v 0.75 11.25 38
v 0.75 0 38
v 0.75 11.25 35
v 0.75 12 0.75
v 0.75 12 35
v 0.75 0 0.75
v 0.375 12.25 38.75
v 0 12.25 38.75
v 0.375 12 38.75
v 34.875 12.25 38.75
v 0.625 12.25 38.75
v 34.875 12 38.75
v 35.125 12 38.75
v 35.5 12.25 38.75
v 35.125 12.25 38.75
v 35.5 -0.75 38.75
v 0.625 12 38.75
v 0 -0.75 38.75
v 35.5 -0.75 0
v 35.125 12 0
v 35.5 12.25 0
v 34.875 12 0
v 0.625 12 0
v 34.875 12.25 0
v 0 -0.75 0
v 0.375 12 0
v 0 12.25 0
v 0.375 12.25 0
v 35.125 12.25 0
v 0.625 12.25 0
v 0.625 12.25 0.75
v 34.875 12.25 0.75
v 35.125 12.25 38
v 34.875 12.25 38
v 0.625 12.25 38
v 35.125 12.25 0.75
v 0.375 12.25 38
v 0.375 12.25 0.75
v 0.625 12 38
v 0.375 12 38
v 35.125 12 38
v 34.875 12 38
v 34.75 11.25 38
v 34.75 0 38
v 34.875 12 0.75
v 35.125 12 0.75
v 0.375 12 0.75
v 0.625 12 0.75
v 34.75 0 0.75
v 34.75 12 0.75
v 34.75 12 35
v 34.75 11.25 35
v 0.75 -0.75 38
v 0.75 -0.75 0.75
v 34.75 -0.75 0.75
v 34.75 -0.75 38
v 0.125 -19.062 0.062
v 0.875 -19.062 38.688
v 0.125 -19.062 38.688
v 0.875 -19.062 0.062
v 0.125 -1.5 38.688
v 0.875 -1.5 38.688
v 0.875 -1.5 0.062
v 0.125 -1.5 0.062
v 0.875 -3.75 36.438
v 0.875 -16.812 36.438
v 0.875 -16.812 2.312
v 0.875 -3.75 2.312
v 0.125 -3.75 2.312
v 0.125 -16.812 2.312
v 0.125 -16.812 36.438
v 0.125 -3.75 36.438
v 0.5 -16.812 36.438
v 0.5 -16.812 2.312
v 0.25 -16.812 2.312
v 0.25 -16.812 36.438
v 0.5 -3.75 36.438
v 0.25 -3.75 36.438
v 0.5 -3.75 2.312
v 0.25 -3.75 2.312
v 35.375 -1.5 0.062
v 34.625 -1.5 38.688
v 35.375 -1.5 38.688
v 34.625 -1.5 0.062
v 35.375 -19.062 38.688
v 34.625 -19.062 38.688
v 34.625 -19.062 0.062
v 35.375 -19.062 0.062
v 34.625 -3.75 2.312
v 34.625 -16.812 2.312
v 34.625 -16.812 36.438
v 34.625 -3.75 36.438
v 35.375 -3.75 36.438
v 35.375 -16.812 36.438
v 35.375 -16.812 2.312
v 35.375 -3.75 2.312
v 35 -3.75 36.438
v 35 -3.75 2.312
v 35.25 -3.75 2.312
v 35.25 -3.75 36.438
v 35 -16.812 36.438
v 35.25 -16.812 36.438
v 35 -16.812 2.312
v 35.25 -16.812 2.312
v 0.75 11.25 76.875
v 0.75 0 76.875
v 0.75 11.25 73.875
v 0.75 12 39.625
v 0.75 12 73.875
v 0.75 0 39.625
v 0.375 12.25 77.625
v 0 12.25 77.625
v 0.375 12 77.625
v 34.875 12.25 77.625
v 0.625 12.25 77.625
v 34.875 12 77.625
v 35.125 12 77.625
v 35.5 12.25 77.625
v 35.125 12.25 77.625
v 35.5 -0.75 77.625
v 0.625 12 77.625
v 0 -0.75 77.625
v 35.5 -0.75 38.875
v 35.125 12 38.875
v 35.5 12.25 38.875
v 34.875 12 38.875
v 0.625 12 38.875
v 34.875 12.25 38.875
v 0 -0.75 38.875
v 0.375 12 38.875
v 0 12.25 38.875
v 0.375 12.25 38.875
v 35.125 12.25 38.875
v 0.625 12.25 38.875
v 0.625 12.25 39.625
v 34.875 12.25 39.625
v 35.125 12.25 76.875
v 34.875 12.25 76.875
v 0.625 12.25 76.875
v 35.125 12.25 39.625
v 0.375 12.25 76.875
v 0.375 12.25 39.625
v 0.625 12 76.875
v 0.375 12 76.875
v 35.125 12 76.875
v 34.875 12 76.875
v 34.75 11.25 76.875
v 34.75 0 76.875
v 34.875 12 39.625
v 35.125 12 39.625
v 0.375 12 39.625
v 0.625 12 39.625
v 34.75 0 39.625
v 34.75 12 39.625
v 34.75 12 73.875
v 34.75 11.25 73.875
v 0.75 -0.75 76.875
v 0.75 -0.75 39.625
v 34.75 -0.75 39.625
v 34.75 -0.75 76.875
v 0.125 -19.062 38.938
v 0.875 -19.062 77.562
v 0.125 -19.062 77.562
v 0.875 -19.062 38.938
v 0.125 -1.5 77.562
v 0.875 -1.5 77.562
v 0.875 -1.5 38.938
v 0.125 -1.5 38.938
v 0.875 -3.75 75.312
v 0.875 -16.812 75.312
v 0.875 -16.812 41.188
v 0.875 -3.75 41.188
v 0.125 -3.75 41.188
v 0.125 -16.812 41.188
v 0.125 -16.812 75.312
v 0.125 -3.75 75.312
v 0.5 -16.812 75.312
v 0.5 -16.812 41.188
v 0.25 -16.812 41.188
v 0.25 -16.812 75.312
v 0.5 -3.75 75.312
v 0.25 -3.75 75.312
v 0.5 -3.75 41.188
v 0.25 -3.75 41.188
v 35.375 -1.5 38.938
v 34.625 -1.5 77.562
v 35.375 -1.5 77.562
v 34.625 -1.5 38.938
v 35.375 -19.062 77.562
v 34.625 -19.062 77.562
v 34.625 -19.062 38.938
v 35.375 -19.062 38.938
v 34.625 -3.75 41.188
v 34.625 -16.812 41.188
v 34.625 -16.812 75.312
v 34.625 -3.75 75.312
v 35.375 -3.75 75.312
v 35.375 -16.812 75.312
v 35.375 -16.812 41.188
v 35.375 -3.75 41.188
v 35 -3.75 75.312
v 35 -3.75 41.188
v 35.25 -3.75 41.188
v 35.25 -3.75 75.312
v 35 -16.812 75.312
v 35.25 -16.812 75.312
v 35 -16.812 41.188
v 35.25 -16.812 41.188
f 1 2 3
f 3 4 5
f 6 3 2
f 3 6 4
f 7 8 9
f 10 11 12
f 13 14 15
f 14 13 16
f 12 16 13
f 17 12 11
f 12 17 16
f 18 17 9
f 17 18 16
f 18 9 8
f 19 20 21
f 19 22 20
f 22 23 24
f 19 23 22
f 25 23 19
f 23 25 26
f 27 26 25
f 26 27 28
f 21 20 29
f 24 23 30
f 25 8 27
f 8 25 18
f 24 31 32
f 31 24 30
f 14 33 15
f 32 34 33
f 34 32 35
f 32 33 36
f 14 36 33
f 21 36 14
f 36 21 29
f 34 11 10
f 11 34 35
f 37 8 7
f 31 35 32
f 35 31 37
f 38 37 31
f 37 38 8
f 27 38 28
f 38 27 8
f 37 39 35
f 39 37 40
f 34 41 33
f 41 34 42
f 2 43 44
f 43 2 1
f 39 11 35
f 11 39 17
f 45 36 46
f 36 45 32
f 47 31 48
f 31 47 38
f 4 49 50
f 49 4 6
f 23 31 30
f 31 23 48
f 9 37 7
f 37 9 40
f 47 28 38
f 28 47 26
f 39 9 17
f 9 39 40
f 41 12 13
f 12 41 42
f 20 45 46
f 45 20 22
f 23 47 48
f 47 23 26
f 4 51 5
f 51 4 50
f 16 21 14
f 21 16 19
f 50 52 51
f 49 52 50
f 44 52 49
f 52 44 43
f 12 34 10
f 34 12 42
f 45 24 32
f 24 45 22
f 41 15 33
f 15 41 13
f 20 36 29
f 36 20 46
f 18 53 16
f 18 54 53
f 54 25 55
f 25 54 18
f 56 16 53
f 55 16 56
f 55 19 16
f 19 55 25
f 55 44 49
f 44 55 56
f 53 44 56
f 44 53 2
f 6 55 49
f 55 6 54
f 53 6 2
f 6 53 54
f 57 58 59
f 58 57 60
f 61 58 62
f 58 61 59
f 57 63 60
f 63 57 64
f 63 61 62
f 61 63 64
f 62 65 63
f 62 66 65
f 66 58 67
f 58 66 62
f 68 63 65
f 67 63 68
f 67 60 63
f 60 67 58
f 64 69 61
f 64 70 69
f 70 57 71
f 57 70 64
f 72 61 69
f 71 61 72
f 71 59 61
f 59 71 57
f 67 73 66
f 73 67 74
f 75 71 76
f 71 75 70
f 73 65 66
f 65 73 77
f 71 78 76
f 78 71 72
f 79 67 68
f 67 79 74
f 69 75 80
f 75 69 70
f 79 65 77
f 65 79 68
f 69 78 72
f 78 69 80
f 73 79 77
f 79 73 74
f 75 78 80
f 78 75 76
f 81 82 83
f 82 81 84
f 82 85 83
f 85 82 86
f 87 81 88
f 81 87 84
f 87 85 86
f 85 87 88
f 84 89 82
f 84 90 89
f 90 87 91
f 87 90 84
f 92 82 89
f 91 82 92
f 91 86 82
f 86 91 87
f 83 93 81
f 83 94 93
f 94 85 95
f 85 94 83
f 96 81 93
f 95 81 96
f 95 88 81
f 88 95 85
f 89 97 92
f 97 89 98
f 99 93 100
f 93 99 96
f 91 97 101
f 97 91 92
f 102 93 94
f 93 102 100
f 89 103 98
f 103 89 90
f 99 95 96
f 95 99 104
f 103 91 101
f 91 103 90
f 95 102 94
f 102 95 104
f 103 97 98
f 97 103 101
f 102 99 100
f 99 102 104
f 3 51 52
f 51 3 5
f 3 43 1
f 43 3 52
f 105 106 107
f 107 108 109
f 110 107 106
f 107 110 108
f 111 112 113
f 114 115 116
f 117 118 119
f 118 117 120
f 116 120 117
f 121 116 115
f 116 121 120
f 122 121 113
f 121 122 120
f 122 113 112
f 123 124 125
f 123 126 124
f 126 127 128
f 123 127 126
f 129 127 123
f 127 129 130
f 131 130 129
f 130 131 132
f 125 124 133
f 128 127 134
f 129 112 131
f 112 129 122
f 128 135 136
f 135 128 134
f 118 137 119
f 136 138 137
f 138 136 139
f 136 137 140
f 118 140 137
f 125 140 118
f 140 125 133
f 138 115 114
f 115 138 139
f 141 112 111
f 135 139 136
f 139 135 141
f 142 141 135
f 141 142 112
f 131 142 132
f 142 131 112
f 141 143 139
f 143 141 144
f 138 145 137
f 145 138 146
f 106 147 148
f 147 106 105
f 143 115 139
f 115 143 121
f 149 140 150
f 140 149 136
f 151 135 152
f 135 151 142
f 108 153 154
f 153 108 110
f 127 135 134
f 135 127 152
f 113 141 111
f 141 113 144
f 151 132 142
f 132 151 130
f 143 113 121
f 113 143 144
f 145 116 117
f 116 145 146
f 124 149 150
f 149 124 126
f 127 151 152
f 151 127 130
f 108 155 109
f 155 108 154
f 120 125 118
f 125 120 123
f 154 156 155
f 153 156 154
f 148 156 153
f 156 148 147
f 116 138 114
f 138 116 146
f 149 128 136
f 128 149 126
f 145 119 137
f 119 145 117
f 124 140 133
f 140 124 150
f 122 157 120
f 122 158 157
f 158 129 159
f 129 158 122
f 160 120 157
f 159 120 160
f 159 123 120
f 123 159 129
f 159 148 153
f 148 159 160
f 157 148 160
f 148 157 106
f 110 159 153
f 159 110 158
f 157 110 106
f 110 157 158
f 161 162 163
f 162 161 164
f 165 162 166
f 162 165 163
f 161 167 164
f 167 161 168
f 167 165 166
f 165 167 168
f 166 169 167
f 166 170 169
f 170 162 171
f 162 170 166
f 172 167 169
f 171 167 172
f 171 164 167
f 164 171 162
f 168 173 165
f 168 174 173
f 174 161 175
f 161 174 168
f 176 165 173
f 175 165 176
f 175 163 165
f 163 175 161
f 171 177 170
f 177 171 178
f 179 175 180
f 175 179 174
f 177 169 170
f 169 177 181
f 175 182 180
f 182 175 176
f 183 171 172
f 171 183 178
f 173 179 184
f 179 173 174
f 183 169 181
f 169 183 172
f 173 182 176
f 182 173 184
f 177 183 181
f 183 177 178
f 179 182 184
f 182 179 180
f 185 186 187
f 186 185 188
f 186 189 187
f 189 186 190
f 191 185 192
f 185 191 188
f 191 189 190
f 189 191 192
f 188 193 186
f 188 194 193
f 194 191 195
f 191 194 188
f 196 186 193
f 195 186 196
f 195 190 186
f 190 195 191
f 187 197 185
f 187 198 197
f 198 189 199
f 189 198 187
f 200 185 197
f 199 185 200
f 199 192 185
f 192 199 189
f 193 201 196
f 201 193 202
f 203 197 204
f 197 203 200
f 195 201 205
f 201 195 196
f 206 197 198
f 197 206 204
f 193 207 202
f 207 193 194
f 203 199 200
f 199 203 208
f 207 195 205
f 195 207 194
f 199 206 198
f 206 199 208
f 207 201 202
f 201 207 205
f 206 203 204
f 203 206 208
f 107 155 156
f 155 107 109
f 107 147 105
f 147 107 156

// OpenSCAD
// --- 1. YOUR EXACT SPECS (INCHES) ---
ancho_total   = 35.5; 
alto_total    = 38.75;   
fondo_box     = 12.25;    
t_plywood     = 0.75;     
t_backer      = 0.25;     
t_face_maple  = 0.75;     
rabbet_d      = 0.125; 

// --- BACKER RABBET SPECS ---
backer_rab_w  = 0.25;     
backer_rab_d  = 0.375;    

// --- MOUNTING BRACKET ---
h_bracket     = 3.0;      
t_bracket     = 0.75;     

// --- 2. YOUR DOOR SPECS ---
door_w        = 17.5625; 
door_h        = 38.625;  
frame_w       = 2.25;     
t_door        = 0.75;     // Thickness of Maple Frame
t_panel       = 0.25;     // Thickness of Plywood Insert
panel_nest_d  = 0.125;    // Recess depth from front face

// Calculated Door Panel (includes 1/4" tongue for the grooves)
panel_w_calc  = door_w - (frame_w * 2) + 0.5;
panel_h_calc  = door_h - (frame_w * 2) + 0.5;

explode       = 0; 
show_labels   = (explode > 0);
Door_Open_Angle = 90;

// --- 3. COLORS ---
color_plywood = [0.82, 0.71, 0.55]; 
color_maple   = [0.45, 0.29, 0.07]; 

$fn = 60;

// --- 4. HELPER: MEASUREMENT LABELS ---
module dim_label(txt, loc=[0,0,0], rot=[90,0,0]) {
    if (show_labels) {
        translate(loc) rotate(rot)
        color("DimGray") linear_extrude(0.1)
            text(str(txt, "\""), size=1.2, halign="center", font="Arial:style=Bold");
    }
}

// --- 5. DOOR MODULE ---
module shaker_door(is_right_door = false) {
    rail_w = door_w - (frame_w * 2);
    pivot_x = is_right_door ? door_w : 0;
    
    rotate([0, 0, is_right_door ? Door_Open_Angle : -Door_Open_Angle])
    translate([-pivot_x, 0, 0])
    union() {
        // THE MAPLE FRAME
        color(color_maple) difference() {
            cube([door_w, t_door, door_h]); 
            // The cutout for the panel
            translate([frame_w, -0.1, frame_w])
                cube([door_w - (frame_w * 2), t_door + 0.2, door_h - (frame_w * 2)]);
        }
        
        // THE PLYWOOD PANEL (Nested 1/8" from the face)
        translate([frame_w - 0.25, panel_nest_d, frame_w - 0.25]) 
            color(color_plywood) cube([panel_w_calc, t_panel, panel_h_calc]);

        if (show_labels) {
            dim_label(door_h, [pivot_x + (is_right_door ? -1 : 1), -1, door_h/2]);
            dim_label(rail_w, [door_w/2, -1, frame_w/2]);
        }
    }
}

module assembly() {
    // A. SIDES
    color(color_plywood) {
        translate([-explode, 0, 0]) difference() {
            cube([t_plywood, fondo_box, alto_total]);
            translate([t_plywood - rabbet_d, -0.1, alto_total - t_plywood]) cube([rabbet_d+0.1, fondo_box+0.2, t_plywood+0.1]);
            translate([t_plywood - rabbet_d, -0.1, -0.1]) cube([rabbet_d+0.1, fondo_box+0.2, t_plywood+0.1]);
            translate([t_plywood - backer_rab_d, fondo_box - backer_rab_w, -0.1]) cube([backer_rab_d + 0.1, backer_rab_w + 0.1, alto_total + 0.2]);
        }
        translate([ancho_total - t_plywood + explode, 0, 0]) difference() {
            cube([t_plywood, fondo_box, alto_total]);
            translate([-0.1, -0.1, alto_total - t_plywood]) cube([rabbet_d+0.1, fondo_box+0.2, t_plywood+0.1]);
            translate([-0.1, -0.1, -0.1]) cube([rabbet_d+0.1, fondo_box+0.2, t_plywood+0.1]);
            translate([-0.1, fondo_box - backer_rab_w, -0.1]) cube([backer_rab_d + 0.1, backer_rab_w + 0.1, alto_total + 0.2]);
        }
    }

    // B. TOP/BOT
    w_horiz = ancho_total - (2 * (t_plywood - rabbet_d));
    horiz_x = t_plywood - rabbet_d;
    color(color_plywood) {
        translate([horiz_x, 0, -explode]) cube([w_horiz, fondo_box, t_plywood]);
        translate([horiz_x, 0, alto_total - t_plywood + explode]) cube([w_horiz, fondo_box, t_plywood]);
    }

    // C. THE BACKER
    w_backer = ancho_total - (2 * (t_plywood - backer_rab_d));
    translate([t_plywood - backer_rab_d, fondo_box - backer_rab_w + (explode*1.5), t_plywood]) {
        color([0.7, 0.6, 0.4]) cube([w_backer, t_backer, alto_total - (2*t_plywood)]);
    }

    // D. MOUNTING BRACKET (Hanging Rail)
    w_bracket = ancho_total - (2 * t_plywood);
    color(color_maple) {
        translate([t_plywood, fondo_box - backer_rab_w - t_bracket + (explode*2), alto_total - t_plywood - h_bracket]) {
            cube([w_bracket, t_bracket, h_bracket]);
        }
    }

    // E. FACE FRAME
    color(color_maple) translate([0, -t_face_maple - explode, 0]) {
        difference() {
            cube([ancho_total, t_face_maple, alto_total]);
            translate([t_plywood, -0.1, t_plywood]) cube([ancho_total - (2 * t_plywood), t_face_maple+0.2, alto_total - (2 * t_plywood)]);
        }
    }

    // F. DOORS
    gap = (ancho_total - (2 * door_w)) / 3;
    d_exp = explode * 2.5; 
    translate([gap, -(t_face_maple + t_door) - d_exp, (alto_total - door_h)/2]) 
        shaker_door(false);
    translate([ancho_total - gap, -(t_face_maple + t_door) - d_exp, (alto_total - door_h)/2]) 
        shaker_door(true);
}

assembly();
translate([0, 0, alto_total + 0.125]) assembly();

// --- 6. SHOP CUT LIST ---
echo("--- SHOP CUT LIST (PER UNIT) ---");
echo(str("DOOR PANEL (2): ", panel_w_calc, " x ", panel_h_calc));
echo(str("DOOR STILES (4): ", door_h, " x ", frame_w));
echo(str("DOOR RAILS (4): ", door_w - (2 * frame_w), " x ", frame_w));
